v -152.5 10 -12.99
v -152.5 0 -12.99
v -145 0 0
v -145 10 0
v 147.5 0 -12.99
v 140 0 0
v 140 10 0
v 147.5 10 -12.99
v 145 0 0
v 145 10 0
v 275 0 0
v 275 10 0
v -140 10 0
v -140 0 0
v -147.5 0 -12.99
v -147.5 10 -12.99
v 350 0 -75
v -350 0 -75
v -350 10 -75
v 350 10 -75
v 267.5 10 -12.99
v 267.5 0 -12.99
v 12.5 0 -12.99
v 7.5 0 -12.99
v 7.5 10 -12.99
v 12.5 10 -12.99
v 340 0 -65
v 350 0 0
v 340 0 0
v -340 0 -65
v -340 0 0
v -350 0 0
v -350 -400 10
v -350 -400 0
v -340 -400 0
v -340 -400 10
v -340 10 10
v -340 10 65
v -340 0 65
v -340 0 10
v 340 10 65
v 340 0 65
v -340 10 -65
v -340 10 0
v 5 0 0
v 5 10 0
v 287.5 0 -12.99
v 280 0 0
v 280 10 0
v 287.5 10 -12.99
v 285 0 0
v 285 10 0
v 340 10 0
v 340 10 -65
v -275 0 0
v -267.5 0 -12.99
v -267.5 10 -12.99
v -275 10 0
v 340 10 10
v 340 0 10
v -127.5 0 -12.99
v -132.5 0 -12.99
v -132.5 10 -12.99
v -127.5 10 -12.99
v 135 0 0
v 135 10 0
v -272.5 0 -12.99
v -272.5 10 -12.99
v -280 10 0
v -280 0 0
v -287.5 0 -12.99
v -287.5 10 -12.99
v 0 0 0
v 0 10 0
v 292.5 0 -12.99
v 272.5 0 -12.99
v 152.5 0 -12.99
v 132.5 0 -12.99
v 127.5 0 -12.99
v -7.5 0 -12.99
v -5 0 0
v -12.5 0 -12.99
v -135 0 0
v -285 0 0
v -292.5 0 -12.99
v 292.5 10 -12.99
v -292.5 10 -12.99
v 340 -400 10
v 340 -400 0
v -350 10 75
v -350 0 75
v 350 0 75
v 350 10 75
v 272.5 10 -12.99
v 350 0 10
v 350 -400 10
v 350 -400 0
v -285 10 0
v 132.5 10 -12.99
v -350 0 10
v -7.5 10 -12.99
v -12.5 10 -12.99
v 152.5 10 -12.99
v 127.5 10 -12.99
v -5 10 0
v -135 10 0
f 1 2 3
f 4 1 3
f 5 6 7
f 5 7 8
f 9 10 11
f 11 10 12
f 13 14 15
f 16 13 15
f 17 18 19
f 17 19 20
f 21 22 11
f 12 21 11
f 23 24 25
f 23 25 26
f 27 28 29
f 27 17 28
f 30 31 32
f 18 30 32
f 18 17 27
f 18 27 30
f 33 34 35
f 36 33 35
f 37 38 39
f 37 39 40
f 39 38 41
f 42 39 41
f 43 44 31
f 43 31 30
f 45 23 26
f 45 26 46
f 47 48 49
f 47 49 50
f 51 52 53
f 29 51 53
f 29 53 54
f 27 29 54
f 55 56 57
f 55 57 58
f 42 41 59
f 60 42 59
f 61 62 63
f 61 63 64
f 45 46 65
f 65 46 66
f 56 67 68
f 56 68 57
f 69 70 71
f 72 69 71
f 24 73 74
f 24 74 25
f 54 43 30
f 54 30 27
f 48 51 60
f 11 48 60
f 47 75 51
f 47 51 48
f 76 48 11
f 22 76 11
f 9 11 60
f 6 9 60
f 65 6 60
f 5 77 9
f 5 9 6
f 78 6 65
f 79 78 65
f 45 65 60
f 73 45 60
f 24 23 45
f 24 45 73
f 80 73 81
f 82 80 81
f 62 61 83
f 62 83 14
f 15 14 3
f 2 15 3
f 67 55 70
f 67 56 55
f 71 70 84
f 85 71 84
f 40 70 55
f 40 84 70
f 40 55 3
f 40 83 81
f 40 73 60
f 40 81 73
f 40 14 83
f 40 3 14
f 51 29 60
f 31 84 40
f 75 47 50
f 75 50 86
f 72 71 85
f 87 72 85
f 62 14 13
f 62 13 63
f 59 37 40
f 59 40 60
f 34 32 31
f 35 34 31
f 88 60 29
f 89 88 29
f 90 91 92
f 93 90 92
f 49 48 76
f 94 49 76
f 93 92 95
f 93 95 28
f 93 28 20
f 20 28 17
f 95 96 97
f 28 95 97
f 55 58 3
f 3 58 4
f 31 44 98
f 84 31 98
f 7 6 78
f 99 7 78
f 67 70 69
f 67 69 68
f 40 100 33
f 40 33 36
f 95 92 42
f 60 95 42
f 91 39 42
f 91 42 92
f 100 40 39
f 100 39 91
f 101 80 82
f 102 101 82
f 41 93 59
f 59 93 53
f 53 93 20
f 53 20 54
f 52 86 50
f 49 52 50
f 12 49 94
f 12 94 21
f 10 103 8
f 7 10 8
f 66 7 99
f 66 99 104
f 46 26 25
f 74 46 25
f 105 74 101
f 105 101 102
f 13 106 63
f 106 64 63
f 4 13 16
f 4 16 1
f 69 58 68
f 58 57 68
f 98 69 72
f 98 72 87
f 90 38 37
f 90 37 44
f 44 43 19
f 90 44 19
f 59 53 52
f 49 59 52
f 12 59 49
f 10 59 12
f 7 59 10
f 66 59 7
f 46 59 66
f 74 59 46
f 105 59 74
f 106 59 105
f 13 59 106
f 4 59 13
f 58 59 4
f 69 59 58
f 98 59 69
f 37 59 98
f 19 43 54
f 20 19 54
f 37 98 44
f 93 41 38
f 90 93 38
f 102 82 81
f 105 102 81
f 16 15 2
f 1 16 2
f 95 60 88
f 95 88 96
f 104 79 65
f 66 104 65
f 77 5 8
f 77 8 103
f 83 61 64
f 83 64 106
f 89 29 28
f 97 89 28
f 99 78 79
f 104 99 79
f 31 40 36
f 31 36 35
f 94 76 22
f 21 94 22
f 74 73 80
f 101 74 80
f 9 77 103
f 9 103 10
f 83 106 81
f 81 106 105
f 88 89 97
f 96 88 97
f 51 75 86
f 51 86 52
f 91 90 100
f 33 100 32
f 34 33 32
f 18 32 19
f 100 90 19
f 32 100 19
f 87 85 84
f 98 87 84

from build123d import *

# Parameters (mm, degrees)
SKETCH1_W           = 700
SKETCH1_H           = 150
BOSS_EXTRUDE1_DEPTH = 10
SKETCH2_W           = 680
SKETCH2_H           = 130
CUT_EXTRUDE1_DEPTH  = 10
SKETCH3_W           = 680
SKETCH3_H           = 10
BOSS_EXTRUDE2_DEPTH = 10
BOSS_EXTRUDE3_DEPTH = 10
SKETCH5_W           = 10
SKETCH5_H           = 10
BOSS_EXTRUDE4_DEPTH = 400


with BuildPart() as part:
    # Sketch1 → Boss-Extrude1 (new body)
    with BuildSketch(Plane(origin=(0, 0, 0), x_dir=(1, 0, 0), z_dir=(0, 1, 0))):
        Rectangle(SKETCH1_W, SKETCH1_H)
    extrude(amount=BOSS_EXTRUDE1_DEPTH)

    # Sketch2 → Cut-Extrude1 (cut)
    with BuildSketch(Plane(origin=(0, 10, 0), x_dir=(1, 0, 0), z_dir=(0, 1, 0))):
        Rectangle(SKETCH2_W, SKETCH2_H)
    extrude(amount=-CUT_EXTRUDE1_DEPTH, mode=Mode.SUBTRACT)

    # Sketch3 → Boss-Extrude2 (add)
    with BuildSketch(Plane(origin=(0, 10, 0), x_dir=(1, 0, 0), z_dir=(0, 1, 0))):
        with Locations((0, -5)):
            Rectangle(SKETCH3_W, SKETCH3_H)
    extrude(amount=-BOSS_EXTRUDE2_DEPTH)

    # Sketch4 → Boss-Extrude3 (add)
    with BuildSketch(Plane(origin=(0, 0, 0), x_dir=(1, 0, 0), z_dir=(0, 1, 0))):
        Polygon((5, 0), (0, 0), (7.5, 12.990381057), (12.5, 12.990381057), align=None)
        Polygon((140, 0), (147.5, 12.990381057), (152.5, 12.990381057), (145, 0), align=None)
        Polygon((140, 0), (132.5, 12.990381057), (127.5, 12.990381057), (135, 0), align=None)
        Polygon((0, 0), (-7.5, 12.990381057), (-12.5, 12.990381057), (-5, 0), align=None)
        Polygon((-140, 0), (-132.5, 12.990381057), (-127.5, 12.990381057), (-135, 0), align=None)
        Polygon((-140, 0), (-147.5, 12.990381057), (-152.5, 12.990381057), (-145, 0), align=None)
        Polygon((-280, 0), (-272.5, 12.990381057), (-267.5, 12.990381057), (-275, 0), align=None)
        Polygon((-280, 0), (-287.5, 12.990381057), (-292.5, 12.990381057), (-285, 0), align=None)
        Polygon((280, 0), (272.5, 12.990381057), (267.5, 12.990381057), (275, 0), align=None)
        Polygon((280, 0), (287.5, 12.990381057), (292.5, 12.990381057), (285, 0), align=None)
    extrude(amount=BOSS_EXTRUDE3_DEPTH)

    # Sketch5 → Boss-Extrude4 (add)
    with BuildSketch(Plane(origin=(0, 0, 0), x_dir=(1, 0, 0), z_dir=(0, 1, 0))):
        with Locations((-345, -5)):
            Rectangle(SKETCH5_W, SKETCH5_H)
        with Locations((345, -5)):
            Rectangle(SKETCH5_W, SKETCH5_H)
    extrude(amount=-BOSS_EXTRUDE4_DEPTH)


solid = part.part
